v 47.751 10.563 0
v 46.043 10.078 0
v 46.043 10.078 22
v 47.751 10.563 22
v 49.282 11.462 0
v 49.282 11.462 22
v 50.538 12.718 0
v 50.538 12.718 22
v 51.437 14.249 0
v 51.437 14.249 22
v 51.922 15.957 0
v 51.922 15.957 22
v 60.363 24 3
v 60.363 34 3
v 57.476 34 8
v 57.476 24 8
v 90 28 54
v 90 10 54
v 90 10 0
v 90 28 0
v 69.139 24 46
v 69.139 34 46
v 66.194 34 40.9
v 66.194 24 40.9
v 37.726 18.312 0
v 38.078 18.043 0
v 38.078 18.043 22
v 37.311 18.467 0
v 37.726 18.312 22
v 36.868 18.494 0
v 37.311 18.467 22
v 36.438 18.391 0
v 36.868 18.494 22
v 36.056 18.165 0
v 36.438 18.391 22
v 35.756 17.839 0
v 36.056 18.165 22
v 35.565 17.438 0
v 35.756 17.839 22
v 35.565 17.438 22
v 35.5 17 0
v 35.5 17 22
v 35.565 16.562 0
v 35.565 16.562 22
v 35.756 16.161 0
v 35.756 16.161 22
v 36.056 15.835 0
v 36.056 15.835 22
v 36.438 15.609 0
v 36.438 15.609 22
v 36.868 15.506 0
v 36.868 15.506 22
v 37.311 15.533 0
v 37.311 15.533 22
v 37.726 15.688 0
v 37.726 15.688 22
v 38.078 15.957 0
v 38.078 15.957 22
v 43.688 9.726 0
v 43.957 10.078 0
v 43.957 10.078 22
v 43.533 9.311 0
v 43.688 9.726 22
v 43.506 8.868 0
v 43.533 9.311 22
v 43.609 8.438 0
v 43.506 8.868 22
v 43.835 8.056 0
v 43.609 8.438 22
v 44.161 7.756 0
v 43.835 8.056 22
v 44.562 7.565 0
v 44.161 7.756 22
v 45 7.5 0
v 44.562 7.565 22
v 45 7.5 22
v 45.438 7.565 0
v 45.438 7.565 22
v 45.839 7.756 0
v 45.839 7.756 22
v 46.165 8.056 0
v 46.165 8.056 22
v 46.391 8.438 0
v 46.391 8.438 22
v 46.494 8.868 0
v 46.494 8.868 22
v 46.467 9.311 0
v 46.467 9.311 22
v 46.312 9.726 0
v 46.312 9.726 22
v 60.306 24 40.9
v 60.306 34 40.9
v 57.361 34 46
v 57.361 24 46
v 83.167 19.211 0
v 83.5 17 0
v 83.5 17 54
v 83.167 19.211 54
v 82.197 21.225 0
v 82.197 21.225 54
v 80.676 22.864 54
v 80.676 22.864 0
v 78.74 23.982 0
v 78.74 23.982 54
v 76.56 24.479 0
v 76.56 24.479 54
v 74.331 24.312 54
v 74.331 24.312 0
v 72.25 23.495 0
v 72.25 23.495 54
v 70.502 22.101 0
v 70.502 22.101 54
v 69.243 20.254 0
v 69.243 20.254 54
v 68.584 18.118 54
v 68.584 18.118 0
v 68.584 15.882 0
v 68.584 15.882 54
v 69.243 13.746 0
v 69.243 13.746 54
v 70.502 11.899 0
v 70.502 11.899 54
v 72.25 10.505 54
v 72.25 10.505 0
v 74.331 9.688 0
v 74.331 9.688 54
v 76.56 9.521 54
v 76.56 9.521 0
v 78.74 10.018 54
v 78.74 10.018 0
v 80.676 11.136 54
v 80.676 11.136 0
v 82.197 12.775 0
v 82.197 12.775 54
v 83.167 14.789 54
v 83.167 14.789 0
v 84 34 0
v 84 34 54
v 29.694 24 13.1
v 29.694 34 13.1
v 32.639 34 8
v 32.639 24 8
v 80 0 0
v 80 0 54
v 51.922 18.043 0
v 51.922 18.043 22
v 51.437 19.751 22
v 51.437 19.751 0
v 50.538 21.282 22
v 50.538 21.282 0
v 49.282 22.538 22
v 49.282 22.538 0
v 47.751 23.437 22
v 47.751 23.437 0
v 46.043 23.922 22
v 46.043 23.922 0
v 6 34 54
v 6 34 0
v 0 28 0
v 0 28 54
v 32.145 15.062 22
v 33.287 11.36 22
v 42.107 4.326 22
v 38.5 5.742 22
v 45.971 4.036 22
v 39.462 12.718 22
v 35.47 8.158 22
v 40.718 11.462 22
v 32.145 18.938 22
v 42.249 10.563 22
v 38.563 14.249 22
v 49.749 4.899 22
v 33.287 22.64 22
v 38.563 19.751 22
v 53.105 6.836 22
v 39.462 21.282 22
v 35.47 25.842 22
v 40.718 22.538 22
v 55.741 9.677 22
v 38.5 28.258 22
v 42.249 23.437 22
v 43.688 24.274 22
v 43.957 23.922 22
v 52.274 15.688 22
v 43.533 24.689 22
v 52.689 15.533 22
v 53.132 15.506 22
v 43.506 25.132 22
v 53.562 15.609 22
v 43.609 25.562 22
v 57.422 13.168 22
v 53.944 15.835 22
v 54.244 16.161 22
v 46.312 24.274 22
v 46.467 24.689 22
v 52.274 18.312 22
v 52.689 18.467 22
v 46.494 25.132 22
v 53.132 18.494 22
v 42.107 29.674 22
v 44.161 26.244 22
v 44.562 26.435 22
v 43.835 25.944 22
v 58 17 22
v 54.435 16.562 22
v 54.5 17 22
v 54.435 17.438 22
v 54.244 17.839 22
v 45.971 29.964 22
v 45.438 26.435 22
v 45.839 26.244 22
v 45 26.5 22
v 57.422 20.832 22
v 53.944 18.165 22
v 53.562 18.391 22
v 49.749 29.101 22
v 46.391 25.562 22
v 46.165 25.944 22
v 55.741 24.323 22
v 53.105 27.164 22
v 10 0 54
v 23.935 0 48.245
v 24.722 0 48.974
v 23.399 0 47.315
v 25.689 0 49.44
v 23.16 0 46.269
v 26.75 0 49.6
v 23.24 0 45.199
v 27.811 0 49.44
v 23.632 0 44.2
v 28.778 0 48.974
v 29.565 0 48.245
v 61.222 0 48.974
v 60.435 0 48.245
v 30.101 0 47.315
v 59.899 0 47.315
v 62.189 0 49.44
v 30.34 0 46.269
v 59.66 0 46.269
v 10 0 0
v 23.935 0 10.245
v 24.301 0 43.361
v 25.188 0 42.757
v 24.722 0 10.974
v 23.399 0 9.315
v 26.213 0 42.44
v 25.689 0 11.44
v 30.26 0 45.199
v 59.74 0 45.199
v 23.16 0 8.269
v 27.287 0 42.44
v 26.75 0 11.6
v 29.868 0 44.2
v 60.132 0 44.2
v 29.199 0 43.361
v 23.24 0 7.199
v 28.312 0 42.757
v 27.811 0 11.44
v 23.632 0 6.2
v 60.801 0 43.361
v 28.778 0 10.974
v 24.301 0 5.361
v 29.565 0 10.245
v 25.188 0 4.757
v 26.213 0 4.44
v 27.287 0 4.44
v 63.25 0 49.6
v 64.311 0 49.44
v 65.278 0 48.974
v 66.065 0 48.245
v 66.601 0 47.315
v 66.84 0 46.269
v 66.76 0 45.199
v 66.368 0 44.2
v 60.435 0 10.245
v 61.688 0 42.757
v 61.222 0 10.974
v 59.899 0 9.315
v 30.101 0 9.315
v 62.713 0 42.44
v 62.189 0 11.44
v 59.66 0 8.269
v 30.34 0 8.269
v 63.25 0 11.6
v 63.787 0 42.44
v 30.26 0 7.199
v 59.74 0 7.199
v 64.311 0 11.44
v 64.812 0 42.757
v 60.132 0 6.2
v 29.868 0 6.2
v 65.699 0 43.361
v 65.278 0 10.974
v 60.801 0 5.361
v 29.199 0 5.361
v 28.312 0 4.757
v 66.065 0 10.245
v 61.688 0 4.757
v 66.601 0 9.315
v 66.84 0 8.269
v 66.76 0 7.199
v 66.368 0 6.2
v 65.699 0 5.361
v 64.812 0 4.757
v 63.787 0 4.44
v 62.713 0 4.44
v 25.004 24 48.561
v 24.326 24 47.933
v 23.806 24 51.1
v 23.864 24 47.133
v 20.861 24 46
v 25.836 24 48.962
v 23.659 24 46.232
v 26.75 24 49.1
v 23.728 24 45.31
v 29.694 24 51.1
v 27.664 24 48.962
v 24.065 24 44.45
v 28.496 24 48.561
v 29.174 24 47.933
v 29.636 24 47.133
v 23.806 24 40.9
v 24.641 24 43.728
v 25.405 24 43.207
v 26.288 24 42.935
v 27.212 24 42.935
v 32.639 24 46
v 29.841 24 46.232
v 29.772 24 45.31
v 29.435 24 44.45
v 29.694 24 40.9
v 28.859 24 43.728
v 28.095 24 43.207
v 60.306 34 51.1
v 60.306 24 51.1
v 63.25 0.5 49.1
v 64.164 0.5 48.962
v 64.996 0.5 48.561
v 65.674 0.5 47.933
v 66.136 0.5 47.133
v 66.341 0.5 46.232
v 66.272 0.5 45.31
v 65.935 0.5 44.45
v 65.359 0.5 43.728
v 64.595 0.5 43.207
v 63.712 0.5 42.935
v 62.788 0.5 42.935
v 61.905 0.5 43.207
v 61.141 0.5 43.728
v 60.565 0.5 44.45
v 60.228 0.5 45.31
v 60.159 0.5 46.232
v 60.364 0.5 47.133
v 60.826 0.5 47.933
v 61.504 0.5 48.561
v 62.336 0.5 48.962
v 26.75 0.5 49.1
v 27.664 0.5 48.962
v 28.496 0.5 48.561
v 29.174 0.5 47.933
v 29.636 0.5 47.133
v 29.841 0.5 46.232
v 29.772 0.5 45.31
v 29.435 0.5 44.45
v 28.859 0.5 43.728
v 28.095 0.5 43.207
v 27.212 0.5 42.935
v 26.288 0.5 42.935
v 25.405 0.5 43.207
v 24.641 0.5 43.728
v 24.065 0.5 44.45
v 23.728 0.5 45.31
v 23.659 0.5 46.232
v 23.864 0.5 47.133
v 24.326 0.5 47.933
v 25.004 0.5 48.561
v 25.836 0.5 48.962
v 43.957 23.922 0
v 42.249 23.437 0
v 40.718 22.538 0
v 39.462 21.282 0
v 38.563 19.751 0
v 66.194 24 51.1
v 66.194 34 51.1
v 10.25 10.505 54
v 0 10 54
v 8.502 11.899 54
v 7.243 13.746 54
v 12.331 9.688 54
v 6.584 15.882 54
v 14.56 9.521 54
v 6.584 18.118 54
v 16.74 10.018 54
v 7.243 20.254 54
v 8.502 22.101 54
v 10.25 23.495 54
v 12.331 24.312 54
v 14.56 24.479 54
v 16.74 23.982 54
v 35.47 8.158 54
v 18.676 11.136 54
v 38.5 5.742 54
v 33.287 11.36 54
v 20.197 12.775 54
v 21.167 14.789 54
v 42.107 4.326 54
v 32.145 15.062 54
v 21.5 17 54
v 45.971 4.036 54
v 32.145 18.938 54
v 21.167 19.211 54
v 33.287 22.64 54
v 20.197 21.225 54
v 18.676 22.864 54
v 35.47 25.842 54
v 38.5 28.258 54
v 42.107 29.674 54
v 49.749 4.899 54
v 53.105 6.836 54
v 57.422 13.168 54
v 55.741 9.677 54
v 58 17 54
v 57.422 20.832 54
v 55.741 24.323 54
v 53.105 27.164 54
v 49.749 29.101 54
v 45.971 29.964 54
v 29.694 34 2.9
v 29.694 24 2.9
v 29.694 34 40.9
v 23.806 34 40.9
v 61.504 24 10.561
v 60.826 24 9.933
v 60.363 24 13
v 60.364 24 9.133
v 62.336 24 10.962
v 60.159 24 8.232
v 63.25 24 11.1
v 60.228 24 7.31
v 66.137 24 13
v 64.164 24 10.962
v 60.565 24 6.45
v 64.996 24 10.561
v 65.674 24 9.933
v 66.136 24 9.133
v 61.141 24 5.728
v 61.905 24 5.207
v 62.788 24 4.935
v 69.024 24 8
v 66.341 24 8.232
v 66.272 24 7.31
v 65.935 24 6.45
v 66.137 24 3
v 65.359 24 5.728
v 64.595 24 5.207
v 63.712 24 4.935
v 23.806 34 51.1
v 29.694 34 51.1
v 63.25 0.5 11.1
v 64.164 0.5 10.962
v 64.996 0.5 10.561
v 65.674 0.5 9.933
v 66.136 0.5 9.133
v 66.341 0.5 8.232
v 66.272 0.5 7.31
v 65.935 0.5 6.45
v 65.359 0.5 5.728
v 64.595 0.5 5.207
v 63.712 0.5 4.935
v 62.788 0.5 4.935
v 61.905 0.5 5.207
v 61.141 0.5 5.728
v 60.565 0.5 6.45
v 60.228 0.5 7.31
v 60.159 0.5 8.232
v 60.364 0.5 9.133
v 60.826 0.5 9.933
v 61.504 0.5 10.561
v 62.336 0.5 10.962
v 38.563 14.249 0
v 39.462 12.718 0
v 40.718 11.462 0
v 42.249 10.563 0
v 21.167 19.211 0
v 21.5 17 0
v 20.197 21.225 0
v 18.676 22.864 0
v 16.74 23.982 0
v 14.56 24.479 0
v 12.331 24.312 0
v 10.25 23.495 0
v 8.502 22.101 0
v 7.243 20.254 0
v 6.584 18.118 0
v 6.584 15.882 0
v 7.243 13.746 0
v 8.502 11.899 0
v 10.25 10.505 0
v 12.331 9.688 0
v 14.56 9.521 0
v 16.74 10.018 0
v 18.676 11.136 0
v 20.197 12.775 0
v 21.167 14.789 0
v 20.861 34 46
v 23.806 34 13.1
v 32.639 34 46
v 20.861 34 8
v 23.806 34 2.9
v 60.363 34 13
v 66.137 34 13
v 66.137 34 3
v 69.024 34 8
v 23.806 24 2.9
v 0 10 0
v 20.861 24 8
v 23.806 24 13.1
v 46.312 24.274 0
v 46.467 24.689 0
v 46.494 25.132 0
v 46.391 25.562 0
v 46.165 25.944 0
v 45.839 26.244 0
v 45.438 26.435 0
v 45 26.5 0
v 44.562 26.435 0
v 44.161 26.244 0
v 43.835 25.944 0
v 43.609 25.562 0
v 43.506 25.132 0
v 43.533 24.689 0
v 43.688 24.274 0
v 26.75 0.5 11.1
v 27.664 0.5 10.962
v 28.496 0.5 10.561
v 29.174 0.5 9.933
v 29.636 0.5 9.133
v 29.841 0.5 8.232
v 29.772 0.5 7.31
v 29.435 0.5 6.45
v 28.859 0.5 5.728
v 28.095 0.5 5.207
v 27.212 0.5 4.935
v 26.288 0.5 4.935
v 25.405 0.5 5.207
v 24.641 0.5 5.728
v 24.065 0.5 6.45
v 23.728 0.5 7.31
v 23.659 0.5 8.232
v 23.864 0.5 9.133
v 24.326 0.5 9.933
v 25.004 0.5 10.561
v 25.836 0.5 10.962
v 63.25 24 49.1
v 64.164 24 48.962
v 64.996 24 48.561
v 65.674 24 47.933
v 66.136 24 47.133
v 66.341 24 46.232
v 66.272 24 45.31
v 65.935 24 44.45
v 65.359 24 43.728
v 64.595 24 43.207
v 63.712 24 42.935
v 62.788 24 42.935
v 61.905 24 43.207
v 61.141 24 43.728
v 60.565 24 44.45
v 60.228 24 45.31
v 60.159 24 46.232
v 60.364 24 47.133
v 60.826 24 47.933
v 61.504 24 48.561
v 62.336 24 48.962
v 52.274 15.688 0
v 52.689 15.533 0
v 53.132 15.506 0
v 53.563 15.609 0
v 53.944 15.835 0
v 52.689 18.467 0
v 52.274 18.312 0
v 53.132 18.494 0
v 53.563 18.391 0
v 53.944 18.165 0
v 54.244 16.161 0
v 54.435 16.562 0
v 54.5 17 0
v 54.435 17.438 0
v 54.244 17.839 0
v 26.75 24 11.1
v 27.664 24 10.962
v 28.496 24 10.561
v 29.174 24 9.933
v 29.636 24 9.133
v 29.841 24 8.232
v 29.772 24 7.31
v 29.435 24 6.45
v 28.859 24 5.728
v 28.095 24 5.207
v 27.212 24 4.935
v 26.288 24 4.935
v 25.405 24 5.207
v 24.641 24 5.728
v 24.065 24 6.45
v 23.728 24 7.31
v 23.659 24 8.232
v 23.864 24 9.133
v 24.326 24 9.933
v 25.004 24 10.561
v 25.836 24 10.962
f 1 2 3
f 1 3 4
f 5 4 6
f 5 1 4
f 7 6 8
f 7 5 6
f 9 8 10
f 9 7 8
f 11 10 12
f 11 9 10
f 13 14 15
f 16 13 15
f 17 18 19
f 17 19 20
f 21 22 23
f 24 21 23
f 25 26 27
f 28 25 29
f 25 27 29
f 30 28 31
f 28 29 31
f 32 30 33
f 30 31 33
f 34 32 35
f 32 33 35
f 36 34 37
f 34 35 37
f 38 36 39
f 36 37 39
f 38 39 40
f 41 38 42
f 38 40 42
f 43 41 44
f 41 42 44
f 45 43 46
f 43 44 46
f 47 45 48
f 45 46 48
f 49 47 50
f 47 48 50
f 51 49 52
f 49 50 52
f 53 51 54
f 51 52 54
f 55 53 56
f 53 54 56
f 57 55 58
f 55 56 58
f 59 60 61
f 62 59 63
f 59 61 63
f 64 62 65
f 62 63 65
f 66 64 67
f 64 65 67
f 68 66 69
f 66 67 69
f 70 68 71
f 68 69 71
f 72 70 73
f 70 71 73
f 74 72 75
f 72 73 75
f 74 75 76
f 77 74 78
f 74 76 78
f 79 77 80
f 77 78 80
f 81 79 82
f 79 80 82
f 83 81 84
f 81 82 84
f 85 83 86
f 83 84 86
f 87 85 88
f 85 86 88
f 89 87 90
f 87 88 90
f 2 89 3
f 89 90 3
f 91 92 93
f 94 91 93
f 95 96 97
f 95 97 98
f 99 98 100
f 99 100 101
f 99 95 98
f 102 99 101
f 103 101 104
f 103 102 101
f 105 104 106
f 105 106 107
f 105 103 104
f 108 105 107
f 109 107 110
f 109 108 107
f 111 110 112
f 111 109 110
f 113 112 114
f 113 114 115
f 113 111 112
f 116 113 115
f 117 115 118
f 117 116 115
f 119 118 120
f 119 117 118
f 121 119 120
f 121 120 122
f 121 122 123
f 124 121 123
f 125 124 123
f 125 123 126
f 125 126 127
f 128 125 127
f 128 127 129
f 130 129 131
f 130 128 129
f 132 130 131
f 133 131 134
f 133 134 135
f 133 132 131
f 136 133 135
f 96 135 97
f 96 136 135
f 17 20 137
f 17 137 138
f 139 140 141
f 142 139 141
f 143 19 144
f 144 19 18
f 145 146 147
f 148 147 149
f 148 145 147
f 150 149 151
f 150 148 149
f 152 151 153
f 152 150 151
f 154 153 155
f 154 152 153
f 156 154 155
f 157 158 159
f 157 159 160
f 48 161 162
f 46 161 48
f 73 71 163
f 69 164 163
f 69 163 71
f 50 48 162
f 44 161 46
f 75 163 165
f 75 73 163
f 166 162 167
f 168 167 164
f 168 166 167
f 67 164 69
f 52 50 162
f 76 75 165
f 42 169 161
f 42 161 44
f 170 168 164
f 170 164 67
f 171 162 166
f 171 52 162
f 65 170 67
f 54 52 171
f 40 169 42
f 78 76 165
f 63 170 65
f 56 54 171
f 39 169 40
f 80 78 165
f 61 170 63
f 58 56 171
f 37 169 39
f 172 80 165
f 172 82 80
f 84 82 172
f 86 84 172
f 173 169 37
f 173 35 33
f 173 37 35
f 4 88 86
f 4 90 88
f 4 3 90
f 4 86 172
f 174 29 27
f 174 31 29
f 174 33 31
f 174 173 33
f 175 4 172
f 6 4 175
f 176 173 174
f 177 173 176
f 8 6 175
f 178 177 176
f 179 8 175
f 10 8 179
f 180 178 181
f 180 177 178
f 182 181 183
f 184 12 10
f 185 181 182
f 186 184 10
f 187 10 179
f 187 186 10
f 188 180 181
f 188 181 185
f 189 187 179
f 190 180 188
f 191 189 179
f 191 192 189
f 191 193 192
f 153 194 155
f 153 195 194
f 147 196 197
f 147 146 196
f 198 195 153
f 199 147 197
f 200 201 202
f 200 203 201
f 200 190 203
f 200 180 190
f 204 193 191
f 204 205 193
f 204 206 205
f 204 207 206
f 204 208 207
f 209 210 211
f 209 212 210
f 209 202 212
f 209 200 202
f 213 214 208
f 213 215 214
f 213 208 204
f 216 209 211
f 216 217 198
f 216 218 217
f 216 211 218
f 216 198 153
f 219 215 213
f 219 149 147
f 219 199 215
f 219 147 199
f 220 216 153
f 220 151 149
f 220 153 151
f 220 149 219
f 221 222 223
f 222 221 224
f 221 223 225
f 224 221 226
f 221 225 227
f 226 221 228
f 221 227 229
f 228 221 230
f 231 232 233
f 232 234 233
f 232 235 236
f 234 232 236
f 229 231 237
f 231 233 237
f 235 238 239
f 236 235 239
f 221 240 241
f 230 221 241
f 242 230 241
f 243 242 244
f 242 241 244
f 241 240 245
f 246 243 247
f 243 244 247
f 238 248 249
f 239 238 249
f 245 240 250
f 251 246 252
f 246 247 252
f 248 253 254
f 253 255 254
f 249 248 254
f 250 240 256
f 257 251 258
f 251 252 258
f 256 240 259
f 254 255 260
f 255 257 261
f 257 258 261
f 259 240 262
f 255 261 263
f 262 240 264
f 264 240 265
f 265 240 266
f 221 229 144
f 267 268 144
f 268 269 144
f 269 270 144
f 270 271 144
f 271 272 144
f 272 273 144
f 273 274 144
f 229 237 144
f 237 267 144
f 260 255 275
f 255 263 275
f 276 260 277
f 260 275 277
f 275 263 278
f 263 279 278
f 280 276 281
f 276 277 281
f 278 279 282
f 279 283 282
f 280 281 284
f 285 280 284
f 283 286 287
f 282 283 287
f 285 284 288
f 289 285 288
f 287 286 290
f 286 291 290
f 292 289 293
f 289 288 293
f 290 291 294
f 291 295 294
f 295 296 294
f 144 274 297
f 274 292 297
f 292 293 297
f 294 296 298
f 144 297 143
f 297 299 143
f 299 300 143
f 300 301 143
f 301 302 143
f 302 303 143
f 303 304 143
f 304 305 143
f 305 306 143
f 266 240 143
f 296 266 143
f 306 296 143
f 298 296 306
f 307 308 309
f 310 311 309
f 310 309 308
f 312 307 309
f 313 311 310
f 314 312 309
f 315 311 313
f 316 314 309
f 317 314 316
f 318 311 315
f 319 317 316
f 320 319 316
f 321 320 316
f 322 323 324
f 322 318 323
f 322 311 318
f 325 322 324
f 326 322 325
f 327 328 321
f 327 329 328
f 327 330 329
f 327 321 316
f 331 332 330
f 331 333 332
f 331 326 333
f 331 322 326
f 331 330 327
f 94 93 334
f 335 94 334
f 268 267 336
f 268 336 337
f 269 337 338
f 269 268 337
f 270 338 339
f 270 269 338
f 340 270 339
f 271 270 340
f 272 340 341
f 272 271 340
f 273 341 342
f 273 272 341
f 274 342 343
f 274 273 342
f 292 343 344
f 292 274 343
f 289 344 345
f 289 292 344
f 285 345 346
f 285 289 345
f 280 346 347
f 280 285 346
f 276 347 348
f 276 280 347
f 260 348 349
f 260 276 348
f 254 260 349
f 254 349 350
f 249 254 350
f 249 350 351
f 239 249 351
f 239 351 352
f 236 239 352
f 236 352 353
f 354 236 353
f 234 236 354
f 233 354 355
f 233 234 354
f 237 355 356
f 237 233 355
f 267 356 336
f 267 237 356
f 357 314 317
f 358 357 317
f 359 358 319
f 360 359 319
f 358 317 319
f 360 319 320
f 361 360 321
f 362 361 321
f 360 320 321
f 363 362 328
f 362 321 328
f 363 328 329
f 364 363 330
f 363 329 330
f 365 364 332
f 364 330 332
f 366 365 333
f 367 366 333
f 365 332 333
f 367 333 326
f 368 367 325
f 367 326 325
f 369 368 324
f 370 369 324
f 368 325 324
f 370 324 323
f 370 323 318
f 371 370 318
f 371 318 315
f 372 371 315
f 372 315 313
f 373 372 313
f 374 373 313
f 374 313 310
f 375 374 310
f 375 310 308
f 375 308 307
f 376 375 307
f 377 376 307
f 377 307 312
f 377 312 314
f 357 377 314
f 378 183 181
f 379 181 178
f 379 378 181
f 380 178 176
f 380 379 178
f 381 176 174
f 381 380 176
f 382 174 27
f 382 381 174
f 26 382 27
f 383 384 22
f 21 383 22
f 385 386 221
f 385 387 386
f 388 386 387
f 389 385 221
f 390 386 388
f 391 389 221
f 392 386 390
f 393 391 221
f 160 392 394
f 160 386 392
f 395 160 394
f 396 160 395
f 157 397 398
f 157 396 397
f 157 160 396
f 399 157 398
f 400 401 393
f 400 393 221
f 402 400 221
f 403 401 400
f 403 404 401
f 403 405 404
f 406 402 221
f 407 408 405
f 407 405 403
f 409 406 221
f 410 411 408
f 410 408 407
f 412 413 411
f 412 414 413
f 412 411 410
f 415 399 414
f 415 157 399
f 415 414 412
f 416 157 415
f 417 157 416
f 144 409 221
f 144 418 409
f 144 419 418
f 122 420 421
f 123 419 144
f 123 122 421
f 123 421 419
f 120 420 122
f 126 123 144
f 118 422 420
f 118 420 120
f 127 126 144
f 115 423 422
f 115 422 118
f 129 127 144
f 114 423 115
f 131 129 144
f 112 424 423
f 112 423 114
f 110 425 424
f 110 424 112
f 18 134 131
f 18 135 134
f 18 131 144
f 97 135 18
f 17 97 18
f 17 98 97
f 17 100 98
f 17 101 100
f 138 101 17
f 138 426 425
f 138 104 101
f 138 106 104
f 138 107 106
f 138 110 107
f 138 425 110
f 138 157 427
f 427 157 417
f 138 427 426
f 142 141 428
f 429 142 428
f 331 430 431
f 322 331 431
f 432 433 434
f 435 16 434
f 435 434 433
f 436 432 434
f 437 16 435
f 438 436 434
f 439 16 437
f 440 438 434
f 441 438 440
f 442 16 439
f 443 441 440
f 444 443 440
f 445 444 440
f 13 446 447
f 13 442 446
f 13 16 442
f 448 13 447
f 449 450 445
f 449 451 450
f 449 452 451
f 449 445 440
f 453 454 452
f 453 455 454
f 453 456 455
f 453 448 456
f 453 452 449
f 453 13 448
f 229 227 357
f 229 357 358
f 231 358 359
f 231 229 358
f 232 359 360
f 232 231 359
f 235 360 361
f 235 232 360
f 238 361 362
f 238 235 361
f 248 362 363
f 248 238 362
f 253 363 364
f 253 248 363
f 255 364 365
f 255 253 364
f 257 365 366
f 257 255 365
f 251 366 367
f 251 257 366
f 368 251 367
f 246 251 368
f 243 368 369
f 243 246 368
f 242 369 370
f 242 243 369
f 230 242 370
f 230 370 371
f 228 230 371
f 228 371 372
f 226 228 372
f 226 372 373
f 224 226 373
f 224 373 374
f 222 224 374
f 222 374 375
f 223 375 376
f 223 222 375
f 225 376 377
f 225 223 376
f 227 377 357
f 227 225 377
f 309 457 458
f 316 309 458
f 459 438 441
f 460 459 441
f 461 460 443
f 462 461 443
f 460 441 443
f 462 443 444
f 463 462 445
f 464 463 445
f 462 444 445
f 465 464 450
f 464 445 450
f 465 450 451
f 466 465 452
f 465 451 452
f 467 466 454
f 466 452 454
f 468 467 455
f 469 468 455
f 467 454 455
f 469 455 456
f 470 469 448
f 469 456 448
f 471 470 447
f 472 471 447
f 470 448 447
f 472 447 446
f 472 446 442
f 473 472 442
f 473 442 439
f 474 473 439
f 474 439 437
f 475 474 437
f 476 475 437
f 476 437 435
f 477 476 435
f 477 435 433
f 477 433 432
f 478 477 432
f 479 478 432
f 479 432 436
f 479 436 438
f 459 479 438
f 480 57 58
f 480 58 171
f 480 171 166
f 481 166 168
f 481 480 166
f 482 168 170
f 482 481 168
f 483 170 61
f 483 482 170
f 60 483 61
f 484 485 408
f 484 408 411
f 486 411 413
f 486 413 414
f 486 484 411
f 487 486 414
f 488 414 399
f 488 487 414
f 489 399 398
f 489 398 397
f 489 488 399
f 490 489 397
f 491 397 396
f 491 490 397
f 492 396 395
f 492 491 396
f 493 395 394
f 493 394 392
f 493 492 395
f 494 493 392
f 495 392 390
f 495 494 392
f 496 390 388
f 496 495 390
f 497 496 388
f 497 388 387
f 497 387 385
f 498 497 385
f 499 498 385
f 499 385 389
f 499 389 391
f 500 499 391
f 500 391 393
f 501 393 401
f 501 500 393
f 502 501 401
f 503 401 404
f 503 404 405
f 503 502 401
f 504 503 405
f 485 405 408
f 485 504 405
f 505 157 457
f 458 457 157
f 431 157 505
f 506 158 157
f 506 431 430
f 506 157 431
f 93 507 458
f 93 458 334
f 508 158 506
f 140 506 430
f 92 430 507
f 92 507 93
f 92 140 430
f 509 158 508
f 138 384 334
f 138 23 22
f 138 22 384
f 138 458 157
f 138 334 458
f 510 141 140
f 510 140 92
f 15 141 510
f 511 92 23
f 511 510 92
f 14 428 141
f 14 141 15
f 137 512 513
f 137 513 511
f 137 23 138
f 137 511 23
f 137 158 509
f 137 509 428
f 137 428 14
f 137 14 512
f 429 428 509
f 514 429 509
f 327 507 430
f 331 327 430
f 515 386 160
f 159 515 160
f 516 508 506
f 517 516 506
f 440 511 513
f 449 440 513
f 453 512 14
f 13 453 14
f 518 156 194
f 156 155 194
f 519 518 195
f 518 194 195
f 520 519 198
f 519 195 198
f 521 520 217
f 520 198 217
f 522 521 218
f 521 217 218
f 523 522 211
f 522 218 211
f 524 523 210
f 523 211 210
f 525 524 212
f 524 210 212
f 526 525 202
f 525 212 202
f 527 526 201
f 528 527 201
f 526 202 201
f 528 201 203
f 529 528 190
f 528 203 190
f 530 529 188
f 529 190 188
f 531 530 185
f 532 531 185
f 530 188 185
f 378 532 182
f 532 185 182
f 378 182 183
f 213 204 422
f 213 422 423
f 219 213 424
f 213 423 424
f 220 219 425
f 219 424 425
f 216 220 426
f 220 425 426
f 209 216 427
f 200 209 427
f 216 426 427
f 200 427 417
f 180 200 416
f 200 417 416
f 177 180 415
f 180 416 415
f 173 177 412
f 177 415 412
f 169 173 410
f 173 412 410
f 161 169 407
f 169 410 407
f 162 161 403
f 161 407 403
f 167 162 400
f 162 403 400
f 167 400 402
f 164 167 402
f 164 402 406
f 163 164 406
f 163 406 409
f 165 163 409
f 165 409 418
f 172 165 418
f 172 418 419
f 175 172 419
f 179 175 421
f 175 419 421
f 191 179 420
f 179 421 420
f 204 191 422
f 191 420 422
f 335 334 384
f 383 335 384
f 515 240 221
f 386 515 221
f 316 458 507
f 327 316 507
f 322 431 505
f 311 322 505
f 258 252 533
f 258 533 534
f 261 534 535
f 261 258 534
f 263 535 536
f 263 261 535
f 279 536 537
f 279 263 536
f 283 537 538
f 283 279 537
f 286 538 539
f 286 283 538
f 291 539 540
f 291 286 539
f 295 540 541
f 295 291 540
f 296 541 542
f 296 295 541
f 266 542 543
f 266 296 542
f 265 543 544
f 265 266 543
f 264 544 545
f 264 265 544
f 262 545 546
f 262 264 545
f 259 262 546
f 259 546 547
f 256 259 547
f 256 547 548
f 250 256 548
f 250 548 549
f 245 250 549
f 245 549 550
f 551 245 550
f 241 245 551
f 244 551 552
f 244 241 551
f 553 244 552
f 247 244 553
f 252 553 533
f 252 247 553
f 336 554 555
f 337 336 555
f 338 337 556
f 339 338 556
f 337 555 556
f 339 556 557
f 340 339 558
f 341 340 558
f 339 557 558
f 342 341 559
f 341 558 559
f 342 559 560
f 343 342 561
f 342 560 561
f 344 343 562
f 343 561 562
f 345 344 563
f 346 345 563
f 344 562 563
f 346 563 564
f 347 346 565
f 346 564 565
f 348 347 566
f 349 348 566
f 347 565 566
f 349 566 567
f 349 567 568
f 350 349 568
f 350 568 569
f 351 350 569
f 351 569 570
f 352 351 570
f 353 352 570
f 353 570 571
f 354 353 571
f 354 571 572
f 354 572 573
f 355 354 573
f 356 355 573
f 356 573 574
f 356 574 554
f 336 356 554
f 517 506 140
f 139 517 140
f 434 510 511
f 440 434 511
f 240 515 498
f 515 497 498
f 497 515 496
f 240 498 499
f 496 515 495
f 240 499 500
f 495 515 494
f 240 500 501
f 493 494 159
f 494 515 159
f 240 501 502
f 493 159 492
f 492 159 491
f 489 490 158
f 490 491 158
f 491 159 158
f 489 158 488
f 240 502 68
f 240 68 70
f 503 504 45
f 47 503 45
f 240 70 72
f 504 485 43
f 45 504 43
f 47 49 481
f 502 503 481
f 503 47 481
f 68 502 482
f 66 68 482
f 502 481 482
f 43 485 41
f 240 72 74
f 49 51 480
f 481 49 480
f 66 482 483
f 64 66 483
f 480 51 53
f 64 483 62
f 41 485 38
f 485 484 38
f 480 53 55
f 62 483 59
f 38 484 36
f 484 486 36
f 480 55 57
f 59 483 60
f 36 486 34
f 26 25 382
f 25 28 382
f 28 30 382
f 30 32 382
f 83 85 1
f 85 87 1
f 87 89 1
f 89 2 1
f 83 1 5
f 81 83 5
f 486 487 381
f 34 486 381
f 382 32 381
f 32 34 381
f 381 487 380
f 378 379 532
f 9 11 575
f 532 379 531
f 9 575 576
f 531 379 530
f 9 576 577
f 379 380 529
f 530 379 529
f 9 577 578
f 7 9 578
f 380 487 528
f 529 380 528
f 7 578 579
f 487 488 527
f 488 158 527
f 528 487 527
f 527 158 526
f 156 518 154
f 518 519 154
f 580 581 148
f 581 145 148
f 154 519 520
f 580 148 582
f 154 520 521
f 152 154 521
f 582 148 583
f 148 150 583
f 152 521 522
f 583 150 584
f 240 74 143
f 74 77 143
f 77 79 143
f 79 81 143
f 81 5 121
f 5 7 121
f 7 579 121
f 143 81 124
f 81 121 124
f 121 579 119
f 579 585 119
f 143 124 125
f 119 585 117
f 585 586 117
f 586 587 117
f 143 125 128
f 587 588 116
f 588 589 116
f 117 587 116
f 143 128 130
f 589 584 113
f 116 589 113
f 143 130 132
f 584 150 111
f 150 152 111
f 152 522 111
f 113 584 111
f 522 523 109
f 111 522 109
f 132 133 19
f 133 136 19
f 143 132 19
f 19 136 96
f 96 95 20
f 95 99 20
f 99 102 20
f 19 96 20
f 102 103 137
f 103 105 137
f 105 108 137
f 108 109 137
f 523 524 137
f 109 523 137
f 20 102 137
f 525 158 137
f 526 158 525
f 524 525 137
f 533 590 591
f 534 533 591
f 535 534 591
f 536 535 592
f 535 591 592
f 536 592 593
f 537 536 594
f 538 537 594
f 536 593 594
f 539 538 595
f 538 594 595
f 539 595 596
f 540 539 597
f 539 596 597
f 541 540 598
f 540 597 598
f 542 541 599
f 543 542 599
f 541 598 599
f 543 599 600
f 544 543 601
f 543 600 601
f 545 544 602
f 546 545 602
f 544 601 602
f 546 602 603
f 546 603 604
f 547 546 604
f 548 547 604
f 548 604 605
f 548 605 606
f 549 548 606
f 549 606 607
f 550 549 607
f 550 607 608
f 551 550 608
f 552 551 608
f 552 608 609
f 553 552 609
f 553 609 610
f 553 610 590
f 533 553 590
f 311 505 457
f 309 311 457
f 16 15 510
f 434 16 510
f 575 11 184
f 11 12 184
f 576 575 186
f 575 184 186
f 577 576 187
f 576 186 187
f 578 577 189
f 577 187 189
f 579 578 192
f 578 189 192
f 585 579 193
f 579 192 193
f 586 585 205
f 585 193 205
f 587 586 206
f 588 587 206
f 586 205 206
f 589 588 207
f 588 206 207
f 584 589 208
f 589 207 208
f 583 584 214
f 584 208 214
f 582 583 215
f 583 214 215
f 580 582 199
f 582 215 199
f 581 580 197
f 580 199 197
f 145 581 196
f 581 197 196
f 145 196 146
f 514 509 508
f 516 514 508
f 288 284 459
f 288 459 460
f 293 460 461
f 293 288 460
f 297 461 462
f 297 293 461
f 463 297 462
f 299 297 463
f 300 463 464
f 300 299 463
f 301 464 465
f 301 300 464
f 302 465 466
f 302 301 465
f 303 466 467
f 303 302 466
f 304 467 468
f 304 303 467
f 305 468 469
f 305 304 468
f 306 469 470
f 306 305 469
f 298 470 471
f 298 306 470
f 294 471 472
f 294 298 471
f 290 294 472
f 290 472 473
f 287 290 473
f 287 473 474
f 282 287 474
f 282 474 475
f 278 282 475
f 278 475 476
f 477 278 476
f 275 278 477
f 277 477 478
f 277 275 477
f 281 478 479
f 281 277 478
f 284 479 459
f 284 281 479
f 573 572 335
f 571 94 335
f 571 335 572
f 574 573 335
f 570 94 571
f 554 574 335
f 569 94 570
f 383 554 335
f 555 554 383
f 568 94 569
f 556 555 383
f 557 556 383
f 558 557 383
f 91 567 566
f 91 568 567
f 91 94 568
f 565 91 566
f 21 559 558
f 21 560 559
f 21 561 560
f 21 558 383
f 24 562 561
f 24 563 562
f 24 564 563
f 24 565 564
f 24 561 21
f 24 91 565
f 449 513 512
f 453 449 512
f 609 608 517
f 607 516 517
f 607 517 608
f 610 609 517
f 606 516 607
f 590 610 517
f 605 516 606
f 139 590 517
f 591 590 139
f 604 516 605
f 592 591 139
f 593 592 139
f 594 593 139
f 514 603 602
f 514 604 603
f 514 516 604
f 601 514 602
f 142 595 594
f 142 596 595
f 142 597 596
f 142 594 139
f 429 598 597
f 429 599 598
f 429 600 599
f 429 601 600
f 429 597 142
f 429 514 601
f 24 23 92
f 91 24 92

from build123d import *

# Parameters (mm, degrees)
SKETCH1_W           = 90
SKETCH1_H           = 34
SKETCH1_R           = 7
SKETCH1_R_2         = 7.5
BOSS_EXTRUDE1_DEPTH = 54
CHAMFER1_SIZE       = 6
CHAMFER2_SIZE       = 10
SKETCH2_R           = 13
CUT_EXTRUDE1_DEPTH  = 32
SKETCH3_R           = 3.1
CUT_EXTRUDE2_DEPTH  = 111.326787318
CUT_EXTRUDE3_DEPTH  = 10
SKETCH5_R           = 1.5
CUT_EXTRUDE4_DEPTH  = 102.390334845
CIRPATTERN1_COUNT   = 4
CHAMFER3_SIZE       = 0.5


with BuildPart() as part:
    # Sketch1 → Boss-Extrude1 (new body)
    with BuildSketch(Plane.XY):
        with Locations((45, 17)):
            Rectangle(SKETCH1_W, SKETCH1_H)
        with Locations((45, 17)):
            Circle(SKETCH1_R, mode=Mode.SUBTRACT)
        with Locations((14, 17)):
            Circle(SKETCH1_R_2, mode=Mode.SUBTRACT)
        with Locations((76, 17)):
            Circle(SKETCH1_R_2, mode=Mode.SUBTRACT)
    extrude(amount=BOSS_EXTRUDE1_DEPTH)

    # Chamfer1
    chamfer1_edges = [part.edges().sort_by_distance(p)[0] for p in [
        (0, 34, 27),
        (90, 34, 27),
    ]]
    chamfer(chamfer1_edges, length=CHAMFER1_SIZE)

    # Chamfer2
    chamfer2_edges = [part.edges().sort_by_distance(p)[0] for p in [
        (90, 0, 27),
        (0, 0, 27),
    ]]
    chamfer(chamfer2_edges, length=CHAMFER2_SIZE)

    # Sketch2 → Cut-Extrude1 (cut)
    with BuildSketch(Plane.XY.offset(54)):
        with Locations((45, 17)):
            Circle(SKETCH2_R)
    extrude(amount=-CUT_EXTRUDE1_DEPTH, mode=Mode.SUBTRACT)

    # Sketch3 → Cut-Extrude2 (cut, through all)
    with BuildSketch(Plane(origin=(0, 34, 0), x_dir=(1, 0, 0), z_dir=(0, 1, 0))):
        with Locations(Location((26.75, -8, 0), (0, 0, 270))):
            Circle(SKETCH3_R)
        with Locations(Location((63.25, -8, 0), (0, 0, 270))):
            Circle(SKETCH3_R)
        with Locations(Location((63.25, -46, 0), (0, 0, 270))):
            Circle(SKETCH3_R)
        with Locations(Location((26.75, -46, 0), (0, 0, 270))):
            Circle(SKETCH3_R)
    extrude(amount=-CUT_EXTRUDE2_DEPTH, mode=Mode.SUBTRACT)

    # Sketch4 → Cut-Extrude3 (cut)
    with BuildSketch(Plane(origin=(0, 34, 0), x_dir=(1, 0, 0), z_dir=(0, 1, 0))):
        Polygon((23.805513627, -13.1), (29.694486373, -13.1), (32.638972746, -8), (29.694486373, -2.9), (23.805513627, -2.9), (20.861027254, -8), align=None)
        Polygon((60.363248654, -13), (66.136751346, -13), (69.023502692, -8), (66.136751346, -3), (60.363248654, -3), (57.476497308, -8), align=None)
        Polygon((60.305513627, -51.1), (66.194486373, -51.1), (69.138972746, -46), (66.194486373, -40.9), (60.305513627, -40.9), (57.361027254, -46), align=None)
        Polygon((29.694486373, -51.1), (32.638972746, -46), (29.694486373, -40.9), (23.805513627, -40.9), (20.861027254, -46), (23.805513627, -51.1), align=None)
    extrude(amount=-CUT_EXTRUDE3_DEPTH, mode=Mode.SUBTRACT)

    # Sketch5 → Cut-Extrude4 (cut, through all)
    with BuildSketch(Plane.XY.offset(22)):
        with Locations((45, 25)):
            Circle(SKETCH5_R)
    cut_extrude4 = extrude(amount=-CUT_EXTRUDE4_DEPTH, mode=Mode.SUBTRACT)

    # CirPattern1: Cut-Extrude4 ×4 about axis
    cirpattern1_axis = Axis((45, 17, 0), (0, 0, 1))
    for i in range(1, CIRPATTERN1_COUNT):
        add(cut_extrude4.rotate(cirpattern1_axis, i * 360 / CIRPATTERN1_COUNT), mode=Mode.SUBTRACT)

    # Chamfer3
    chamfer3_edges = [part.edges().sort_by_distance(p)[0] for p in [
        (26.75, 0, 42.9),
        (63.25, 0, 42.9),
        (63.25, 0, 4.9),
        (26.75, 0, 4.9),
    ]]
    chamfer(chamfer3_edges, length=CHAMFER3_SIZE)


solid = part.part
